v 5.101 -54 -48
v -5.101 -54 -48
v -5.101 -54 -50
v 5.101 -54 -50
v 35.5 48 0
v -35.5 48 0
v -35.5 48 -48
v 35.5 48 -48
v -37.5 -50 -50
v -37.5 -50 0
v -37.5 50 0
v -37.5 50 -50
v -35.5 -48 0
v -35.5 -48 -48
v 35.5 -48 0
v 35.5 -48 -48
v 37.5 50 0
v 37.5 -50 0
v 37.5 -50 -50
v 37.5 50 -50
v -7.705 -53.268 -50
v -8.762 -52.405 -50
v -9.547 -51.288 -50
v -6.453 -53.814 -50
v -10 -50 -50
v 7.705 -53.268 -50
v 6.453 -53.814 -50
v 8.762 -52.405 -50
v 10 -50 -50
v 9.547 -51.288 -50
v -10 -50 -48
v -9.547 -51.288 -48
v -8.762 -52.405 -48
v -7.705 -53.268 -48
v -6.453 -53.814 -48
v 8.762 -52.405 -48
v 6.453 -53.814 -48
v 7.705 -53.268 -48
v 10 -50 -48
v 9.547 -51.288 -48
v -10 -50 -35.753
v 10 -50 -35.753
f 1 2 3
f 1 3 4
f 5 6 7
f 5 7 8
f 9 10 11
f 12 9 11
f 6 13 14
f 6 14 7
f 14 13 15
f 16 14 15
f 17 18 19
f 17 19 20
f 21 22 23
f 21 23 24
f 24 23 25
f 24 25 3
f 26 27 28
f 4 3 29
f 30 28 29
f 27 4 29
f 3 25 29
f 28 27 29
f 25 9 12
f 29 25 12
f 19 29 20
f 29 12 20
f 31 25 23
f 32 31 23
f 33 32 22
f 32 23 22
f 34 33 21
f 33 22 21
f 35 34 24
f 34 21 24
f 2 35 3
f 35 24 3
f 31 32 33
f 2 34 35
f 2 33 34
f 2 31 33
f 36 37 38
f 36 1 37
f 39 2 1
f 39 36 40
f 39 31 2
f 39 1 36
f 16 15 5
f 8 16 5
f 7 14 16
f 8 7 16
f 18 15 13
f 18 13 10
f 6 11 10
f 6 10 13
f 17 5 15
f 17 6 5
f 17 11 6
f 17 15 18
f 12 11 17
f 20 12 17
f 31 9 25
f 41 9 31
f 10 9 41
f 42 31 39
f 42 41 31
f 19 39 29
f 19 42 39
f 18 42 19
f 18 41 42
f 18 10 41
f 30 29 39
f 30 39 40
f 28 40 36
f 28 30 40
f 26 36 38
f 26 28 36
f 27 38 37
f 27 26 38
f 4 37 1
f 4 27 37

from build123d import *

# Parameters (mm, degrees)
F2_W        = 75
F2_H        = 100
F3_DEPTH    = 50
F4_T        = -2
F5_W        = 20
F5_H        = 2
F6_DEPTH    = 4
F7_T1_DEPTH = 26.4948974279


# Not quite as in the source:
# - a fillet or chamfer that OpenCascade refuses, or shapes differently, is made with other operations: its cross-section is extruded or revolved along the edge and cut away or added


with BuildPart() as f3:
    # F2 (on Top) → F3 (new body)
    with BuildSketch(Plane.XY):
        Rectangle(F2_W, F2_H)
    extrude(amount=-F3_DEPTH)

    # F4
    f4_openings = [f3.faces().sort_by_distance(p)[0] for p in [
        (0, 0, 0),
    ]]
    offset(amount=F4_T, openings=f4_openings)

    # F5 (on face) → F6 (join)
    with BuildSketch(Plane.XZ.offset(50)):
        with Locations((0, -49)):
            Rectangle(F5_W, F5_H)
    extrude(amount=F6_DEPTH)

    # F7: fillet of radius 5 on 2 edges, made by hand

    # F7_s2 → F7_t1 (cut)
    with BuildSketch(Plane.XY.offset(-62.2474487139)):
        with BuildLine():
            ThreePointArc((10, -50), (8.2632981746, -52.8729833462), (5.1010205144, -54))
            Line((5.1010205144, -54), (10, -54))
            Line((10, -54), (10, -50))
        make_face()
        with BuildLine():
            ThreePointArc((-10, -50), (-8.2632981746, -52.8729833462), (-5.1010205144, -54))
            Line((-5.1010205144, -54), (-10, -54))
            Line((-10, -54), (-10, -50))
        make_face()
    extrude(amount=F7_T1_DEPTH, mode=Mode.SUBTRACT)


solid = f3.part
